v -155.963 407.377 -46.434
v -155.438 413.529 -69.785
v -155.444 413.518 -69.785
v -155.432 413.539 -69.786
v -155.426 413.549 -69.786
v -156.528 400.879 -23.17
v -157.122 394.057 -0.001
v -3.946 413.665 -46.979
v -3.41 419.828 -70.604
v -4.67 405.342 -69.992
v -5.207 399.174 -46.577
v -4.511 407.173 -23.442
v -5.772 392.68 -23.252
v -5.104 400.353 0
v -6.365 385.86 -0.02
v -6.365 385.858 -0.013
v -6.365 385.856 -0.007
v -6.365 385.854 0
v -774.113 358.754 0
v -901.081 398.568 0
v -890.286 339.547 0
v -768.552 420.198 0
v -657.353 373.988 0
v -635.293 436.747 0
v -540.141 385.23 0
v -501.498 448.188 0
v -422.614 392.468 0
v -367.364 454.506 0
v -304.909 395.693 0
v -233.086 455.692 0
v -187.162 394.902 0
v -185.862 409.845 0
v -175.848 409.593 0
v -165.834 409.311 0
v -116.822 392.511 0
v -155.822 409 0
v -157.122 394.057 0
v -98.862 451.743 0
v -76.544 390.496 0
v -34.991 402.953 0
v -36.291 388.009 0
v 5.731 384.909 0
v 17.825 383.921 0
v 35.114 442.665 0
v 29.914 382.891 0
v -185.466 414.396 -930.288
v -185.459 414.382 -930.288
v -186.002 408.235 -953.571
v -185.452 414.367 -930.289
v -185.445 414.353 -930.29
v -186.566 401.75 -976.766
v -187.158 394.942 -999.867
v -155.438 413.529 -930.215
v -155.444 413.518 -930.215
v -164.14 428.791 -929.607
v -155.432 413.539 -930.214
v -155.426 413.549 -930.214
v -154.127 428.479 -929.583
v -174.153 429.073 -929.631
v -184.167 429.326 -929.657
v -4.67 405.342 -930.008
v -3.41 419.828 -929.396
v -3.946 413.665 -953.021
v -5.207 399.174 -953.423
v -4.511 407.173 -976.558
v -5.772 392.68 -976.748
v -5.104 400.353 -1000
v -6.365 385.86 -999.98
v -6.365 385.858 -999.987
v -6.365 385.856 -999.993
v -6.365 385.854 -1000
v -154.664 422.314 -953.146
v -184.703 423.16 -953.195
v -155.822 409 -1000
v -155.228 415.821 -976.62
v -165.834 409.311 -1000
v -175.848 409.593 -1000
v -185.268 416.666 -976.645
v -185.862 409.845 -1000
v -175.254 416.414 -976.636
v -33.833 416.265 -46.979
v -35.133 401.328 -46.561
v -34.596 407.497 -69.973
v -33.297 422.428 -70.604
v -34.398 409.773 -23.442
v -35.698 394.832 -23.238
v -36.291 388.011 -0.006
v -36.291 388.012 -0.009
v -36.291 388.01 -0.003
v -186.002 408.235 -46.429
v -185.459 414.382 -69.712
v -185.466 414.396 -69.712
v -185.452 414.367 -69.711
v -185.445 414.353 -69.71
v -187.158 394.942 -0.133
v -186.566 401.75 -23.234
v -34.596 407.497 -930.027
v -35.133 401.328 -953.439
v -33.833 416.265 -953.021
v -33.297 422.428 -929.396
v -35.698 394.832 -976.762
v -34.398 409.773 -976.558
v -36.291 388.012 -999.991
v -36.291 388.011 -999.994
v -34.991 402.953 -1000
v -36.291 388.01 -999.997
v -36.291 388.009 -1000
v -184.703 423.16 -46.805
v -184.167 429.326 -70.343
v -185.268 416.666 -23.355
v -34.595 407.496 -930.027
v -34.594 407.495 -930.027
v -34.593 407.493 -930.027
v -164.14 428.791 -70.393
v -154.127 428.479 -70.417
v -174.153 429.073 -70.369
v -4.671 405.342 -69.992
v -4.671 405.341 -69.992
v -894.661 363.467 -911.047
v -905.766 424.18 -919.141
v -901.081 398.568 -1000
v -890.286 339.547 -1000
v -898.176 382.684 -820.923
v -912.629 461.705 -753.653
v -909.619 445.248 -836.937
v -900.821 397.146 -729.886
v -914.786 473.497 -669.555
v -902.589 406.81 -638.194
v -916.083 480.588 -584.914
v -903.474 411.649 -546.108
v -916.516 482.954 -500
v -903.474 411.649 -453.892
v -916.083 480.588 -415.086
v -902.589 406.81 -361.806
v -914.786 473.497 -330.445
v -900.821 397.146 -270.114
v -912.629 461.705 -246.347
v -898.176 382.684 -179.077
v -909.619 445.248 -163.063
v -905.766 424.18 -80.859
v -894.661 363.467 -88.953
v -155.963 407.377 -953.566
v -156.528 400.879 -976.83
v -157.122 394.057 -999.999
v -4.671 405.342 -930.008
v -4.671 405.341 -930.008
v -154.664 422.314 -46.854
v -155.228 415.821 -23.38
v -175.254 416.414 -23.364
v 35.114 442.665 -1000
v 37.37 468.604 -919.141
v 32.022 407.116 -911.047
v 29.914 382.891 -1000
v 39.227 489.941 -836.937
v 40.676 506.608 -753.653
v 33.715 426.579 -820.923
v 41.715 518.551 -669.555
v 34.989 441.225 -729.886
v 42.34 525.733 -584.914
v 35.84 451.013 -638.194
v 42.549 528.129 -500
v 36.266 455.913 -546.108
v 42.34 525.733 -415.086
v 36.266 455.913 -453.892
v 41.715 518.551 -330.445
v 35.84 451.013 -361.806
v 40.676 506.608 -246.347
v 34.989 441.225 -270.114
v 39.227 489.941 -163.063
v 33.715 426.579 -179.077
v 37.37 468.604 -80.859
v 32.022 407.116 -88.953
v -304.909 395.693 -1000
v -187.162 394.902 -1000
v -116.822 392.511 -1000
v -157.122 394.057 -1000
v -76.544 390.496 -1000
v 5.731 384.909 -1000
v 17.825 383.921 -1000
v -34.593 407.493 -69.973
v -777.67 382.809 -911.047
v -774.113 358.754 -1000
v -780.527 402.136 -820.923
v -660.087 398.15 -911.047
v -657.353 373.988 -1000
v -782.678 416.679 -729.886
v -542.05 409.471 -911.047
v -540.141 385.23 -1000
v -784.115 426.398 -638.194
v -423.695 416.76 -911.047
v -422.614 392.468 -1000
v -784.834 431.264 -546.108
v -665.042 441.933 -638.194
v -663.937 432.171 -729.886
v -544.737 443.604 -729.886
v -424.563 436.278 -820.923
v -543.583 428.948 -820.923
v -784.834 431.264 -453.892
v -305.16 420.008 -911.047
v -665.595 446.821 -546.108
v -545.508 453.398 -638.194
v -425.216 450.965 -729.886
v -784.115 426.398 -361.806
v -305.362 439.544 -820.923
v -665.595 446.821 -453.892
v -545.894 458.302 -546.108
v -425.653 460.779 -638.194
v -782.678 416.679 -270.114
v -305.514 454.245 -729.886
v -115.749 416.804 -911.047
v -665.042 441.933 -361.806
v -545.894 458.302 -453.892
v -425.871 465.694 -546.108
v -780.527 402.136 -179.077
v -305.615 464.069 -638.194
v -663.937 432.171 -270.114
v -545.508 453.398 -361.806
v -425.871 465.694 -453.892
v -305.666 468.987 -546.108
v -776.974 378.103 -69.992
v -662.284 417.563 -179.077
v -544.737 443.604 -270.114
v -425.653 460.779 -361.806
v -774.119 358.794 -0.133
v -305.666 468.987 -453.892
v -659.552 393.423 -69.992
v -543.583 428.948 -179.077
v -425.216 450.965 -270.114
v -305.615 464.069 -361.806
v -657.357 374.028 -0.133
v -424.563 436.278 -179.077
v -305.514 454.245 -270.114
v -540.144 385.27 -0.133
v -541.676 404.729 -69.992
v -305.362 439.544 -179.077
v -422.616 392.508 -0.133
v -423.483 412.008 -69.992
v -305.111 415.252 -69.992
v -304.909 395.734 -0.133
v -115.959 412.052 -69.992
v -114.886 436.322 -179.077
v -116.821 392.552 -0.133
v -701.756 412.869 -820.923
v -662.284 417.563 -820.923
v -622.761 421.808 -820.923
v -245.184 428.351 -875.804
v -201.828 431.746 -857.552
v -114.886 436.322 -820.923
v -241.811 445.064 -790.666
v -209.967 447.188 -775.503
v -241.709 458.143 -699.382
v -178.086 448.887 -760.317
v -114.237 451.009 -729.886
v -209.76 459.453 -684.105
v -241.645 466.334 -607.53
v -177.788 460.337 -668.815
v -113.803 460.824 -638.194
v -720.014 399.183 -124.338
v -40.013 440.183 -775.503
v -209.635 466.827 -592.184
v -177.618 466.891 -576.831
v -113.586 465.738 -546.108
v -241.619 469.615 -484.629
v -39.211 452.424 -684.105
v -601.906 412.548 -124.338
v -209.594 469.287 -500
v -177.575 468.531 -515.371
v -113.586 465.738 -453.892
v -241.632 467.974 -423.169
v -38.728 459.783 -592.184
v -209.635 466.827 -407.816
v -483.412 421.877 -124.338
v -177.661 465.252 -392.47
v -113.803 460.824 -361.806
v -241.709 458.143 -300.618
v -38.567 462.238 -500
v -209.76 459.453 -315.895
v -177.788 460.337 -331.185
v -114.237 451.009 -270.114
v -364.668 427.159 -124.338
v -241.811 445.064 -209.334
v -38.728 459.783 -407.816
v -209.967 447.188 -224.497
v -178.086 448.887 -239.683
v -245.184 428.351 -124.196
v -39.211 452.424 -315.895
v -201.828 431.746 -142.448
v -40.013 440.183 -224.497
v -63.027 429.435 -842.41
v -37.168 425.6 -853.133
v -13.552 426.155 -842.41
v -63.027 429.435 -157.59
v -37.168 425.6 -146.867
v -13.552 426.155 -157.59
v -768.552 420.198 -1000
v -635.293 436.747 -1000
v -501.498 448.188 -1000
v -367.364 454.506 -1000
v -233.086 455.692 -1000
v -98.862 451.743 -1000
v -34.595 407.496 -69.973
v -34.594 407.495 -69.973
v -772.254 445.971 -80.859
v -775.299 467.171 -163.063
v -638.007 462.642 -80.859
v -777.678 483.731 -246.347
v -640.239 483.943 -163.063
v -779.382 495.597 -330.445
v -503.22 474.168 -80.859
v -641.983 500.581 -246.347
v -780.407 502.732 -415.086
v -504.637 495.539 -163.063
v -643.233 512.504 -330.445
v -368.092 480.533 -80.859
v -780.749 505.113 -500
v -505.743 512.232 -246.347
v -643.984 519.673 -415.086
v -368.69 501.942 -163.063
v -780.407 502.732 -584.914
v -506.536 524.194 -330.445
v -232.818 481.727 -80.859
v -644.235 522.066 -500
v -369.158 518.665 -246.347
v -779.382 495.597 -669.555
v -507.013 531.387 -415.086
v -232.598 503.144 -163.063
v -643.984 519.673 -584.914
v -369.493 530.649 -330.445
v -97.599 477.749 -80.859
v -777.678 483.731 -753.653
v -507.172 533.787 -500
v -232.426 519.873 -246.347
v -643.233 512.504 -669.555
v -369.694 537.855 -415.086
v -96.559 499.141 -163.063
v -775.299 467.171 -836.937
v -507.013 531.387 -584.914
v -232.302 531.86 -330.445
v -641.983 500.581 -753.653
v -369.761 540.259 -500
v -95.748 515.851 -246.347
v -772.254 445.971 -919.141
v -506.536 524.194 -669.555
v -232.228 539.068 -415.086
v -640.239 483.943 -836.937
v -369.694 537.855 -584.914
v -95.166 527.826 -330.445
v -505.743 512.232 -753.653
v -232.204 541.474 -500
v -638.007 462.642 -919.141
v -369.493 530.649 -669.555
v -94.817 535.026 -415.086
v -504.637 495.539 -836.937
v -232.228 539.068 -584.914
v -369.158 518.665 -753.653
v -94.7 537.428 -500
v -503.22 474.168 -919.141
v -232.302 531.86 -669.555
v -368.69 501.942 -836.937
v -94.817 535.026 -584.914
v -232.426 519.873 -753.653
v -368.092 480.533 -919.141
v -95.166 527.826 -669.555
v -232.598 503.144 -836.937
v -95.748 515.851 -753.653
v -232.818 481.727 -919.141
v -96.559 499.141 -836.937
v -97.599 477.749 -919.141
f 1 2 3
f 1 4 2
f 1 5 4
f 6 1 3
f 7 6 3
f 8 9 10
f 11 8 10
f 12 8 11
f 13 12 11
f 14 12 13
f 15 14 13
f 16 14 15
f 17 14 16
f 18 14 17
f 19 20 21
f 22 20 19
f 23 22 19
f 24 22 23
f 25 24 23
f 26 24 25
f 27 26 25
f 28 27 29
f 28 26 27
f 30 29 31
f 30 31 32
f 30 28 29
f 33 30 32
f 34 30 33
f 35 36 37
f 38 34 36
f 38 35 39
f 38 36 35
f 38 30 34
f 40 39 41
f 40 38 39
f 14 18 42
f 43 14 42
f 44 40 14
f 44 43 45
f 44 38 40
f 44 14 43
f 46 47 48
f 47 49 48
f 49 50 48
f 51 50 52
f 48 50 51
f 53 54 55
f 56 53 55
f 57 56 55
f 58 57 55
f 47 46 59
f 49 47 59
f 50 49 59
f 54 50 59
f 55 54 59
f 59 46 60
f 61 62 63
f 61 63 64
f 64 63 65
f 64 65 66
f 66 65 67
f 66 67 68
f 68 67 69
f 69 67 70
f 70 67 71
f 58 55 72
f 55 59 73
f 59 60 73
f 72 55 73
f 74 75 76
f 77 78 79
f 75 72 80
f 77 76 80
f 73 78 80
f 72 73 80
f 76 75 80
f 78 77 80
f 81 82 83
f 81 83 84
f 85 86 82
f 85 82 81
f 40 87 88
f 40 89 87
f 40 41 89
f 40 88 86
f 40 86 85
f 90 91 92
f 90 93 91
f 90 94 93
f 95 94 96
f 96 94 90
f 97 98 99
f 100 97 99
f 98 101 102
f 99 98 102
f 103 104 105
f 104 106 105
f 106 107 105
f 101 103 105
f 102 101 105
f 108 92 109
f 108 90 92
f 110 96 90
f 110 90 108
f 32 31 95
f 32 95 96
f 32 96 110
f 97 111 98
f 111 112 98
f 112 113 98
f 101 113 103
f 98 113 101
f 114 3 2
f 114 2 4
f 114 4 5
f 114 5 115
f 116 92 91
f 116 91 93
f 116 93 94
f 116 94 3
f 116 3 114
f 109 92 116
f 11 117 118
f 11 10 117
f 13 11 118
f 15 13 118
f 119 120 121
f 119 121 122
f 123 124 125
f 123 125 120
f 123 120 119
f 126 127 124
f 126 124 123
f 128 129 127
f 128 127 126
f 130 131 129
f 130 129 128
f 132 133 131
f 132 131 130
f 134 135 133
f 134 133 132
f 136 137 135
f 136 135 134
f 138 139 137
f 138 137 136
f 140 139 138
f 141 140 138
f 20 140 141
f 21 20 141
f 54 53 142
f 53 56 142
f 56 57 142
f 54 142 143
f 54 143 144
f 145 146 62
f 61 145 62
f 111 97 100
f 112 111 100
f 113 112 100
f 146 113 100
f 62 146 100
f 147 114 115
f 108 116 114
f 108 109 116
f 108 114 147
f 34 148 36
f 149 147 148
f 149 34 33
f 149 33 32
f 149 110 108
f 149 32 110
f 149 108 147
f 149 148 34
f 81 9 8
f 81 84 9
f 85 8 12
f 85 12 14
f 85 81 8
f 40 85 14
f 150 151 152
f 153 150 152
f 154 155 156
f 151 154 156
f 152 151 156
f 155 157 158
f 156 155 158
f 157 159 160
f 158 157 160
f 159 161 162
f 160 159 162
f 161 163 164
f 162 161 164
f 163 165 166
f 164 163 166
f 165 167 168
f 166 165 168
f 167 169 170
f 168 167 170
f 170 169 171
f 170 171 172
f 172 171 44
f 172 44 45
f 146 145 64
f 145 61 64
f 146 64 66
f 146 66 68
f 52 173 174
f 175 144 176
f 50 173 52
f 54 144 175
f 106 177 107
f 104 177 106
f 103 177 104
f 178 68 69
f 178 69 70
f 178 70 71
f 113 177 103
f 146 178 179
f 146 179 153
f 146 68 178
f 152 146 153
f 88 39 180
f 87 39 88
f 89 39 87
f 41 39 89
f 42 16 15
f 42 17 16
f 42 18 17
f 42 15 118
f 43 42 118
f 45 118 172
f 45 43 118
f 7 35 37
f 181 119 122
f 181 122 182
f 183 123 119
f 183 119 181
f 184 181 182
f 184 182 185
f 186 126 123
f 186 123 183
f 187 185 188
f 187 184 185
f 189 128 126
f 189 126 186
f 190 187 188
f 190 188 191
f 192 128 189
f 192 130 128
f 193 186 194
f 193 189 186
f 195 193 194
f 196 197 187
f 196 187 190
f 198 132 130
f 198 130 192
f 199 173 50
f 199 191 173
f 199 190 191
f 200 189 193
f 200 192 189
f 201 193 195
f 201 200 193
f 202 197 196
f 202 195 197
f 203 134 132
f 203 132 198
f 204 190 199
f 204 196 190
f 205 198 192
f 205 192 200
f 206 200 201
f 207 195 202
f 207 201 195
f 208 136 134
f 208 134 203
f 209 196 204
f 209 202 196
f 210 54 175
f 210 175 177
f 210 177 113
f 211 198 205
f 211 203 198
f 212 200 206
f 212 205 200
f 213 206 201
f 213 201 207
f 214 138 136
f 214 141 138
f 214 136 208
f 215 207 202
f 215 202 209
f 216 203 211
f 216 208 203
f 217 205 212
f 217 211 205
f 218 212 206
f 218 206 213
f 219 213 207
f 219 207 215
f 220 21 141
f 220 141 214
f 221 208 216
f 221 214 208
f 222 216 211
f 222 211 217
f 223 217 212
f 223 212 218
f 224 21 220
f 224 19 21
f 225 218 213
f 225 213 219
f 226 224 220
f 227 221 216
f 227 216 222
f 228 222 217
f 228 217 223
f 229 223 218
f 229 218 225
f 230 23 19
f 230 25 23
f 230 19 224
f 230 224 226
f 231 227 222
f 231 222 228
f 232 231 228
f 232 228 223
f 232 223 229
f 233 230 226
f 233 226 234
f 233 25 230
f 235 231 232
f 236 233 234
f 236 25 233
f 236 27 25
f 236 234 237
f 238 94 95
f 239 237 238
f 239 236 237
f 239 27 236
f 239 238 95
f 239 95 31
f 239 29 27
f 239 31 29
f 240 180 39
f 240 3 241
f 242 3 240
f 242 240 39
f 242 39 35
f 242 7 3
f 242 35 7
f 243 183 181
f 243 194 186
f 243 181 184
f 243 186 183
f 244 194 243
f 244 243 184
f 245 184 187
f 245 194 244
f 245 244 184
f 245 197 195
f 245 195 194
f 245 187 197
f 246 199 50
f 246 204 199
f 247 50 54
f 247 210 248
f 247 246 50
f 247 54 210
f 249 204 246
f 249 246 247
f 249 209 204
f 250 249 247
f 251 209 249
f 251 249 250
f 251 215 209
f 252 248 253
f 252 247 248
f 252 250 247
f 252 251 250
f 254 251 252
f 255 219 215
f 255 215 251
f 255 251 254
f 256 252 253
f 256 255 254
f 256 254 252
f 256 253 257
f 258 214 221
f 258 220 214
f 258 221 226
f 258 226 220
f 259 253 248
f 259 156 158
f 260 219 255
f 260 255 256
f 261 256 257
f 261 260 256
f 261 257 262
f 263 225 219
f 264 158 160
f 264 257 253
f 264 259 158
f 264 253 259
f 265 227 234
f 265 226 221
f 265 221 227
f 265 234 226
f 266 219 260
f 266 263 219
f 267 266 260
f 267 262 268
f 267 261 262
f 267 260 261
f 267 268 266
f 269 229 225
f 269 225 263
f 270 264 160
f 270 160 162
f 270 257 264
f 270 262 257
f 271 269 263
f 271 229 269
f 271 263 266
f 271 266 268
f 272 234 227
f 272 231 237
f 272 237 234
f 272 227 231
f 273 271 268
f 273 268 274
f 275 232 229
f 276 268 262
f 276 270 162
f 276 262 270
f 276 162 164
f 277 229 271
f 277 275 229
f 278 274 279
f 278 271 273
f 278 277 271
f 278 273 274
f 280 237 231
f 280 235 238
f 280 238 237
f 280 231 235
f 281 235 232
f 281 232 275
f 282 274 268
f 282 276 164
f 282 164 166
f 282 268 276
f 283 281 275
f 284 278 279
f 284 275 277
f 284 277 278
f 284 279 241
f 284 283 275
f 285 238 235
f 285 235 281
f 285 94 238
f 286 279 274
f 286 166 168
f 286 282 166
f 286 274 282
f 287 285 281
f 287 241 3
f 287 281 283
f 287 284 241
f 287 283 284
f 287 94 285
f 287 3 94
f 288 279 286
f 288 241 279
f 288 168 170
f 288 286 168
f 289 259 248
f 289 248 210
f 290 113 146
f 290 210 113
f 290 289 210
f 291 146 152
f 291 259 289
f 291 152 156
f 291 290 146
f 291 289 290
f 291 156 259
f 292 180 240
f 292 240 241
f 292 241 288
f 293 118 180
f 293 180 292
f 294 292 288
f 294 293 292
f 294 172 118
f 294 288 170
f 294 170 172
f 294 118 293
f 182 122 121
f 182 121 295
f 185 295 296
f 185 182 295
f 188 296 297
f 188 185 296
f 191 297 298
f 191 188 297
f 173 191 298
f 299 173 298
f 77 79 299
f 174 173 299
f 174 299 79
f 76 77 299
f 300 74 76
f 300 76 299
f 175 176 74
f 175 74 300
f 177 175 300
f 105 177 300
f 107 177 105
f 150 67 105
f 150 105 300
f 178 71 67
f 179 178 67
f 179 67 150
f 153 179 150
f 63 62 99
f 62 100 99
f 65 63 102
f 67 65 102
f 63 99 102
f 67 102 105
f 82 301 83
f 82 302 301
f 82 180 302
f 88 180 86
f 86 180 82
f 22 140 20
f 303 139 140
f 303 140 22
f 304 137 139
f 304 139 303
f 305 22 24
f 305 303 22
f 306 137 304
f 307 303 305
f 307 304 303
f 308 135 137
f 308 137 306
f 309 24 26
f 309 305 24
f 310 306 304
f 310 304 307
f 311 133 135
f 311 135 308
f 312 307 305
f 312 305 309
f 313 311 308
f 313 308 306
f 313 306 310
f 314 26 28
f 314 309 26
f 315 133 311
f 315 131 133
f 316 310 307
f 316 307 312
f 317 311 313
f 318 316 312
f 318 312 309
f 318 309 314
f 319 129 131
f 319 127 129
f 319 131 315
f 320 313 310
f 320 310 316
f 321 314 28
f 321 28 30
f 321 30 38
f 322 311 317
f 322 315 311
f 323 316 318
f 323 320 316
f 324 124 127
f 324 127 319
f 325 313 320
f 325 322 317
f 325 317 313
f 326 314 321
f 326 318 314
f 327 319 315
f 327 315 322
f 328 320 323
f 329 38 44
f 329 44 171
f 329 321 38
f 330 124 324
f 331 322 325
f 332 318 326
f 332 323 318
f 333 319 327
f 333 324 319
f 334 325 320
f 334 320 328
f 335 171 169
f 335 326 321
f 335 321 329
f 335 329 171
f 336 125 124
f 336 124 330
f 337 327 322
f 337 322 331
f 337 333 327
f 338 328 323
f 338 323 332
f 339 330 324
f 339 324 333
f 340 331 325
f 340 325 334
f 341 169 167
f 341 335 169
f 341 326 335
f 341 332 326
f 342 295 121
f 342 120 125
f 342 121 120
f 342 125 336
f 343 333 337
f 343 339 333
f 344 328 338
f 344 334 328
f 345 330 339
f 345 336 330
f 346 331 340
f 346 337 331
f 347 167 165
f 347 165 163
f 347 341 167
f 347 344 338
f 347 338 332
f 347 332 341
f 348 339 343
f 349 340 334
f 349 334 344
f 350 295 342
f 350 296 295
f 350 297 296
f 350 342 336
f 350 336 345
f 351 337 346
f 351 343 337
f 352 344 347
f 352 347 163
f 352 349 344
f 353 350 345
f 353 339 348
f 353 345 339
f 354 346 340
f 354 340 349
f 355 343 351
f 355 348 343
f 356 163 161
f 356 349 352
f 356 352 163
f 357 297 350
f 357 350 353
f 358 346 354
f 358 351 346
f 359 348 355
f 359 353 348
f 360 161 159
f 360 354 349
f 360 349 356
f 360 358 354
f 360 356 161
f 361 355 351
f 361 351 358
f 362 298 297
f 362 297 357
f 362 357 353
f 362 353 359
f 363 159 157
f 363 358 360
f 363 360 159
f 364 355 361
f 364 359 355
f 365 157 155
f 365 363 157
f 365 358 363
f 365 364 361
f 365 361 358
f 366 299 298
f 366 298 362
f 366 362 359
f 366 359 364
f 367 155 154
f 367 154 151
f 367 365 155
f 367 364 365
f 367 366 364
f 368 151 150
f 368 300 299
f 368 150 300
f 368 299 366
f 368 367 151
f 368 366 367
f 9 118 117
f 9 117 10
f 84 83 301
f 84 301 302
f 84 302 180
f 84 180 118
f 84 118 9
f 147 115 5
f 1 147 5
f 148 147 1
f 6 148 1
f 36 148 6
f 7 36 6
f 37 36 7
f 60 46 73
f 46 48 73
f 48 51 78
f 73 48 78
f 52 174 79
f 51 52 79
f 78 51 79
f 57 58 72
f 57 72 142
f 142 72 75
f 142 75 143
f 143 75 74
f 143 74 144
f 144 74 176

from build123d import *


with BuildPart() as part:
    # Sweep1: sweep along a path in Sketch1
    with BuildLine(Plane.XY) as sweep1_path:
        ThreePointArc((-890.285718, 339.546922), (-431.638177, 392.054842), (29.914282, 382.890989))
    # Sketch3 → Sweep1 (sweep)
    with BuildSketch(Plane(origin=(-890.285718, 339.546922, 0), x_dir=(0, 0, 1), z_dir=(-0.983681, -0.179923, 0))):
        with BuildLine():
            Line((0, 0), (0, 60))
            ThreePointArc((0, 60), (-500, 145.786438), (-1000, 60))
            Line((-1000, 60), (-1000, 0))
            ThreePointArc((-1000, 0), (-500, 73.913317), (0, 0))
        make_face()
    sweep(path=sweep1_path.line)

    # Cut-Sweep1: sweep along a path in Sketch19
    with BuildLine(Plane(origin=(-205.375388, 17.865632, 0), x_dir=(0, 0, -1), z_dir=(0.996238, -0.086663, 0))) as cut_sweep1_path:
        ThreePointArc((70, 403.60426), (34.897149, 394.191626), (0, 384.042894))
    # Sketch4 → Cut-Sweep1 (sweep, cut)
    with BuildSketch(Plane.XY):
        with BuildLine():
            Line((-185.86158, 409.845466), (-187.161523, 394.901901))
            ThreePointArc((-187.161523, 394.901901), (-172.395032, 385.472889), (-157.121749, 394.056733))
            Line((-157.121749, 394.056733), (-155.821806, 409.000299))
            ThreePointArc((-155.821806, 409.000299), (-170.840774, 409.455574), (-185.86158, 409.845466))
        make_face()
    cut_sweep1 = sweep(path=cut_sweep1_path.line, mode=Mode.SUBTRACT)

    # Cut-Sweep6: sweep along a path in Sketch24
    with BuildLine(Plane(origin=(-54.770437, 4.764487, 0), x_dir=(0, 0, -1), z_dir=(0.996238, -0.086663, 0))) as cut_sweep6_path:
        ThreePointArc((70, 403.60426), (34.897149, 394.191626), (0, 384.042894))
    # Sketch22 → Cut-Sweep6 (sweep, cut)
    with BuildSketch(Plane.XY):
        with BuildLine():
            Line((-6.365403, 385.85431), (-5.10418, 400.352779))
            Line((-5.10418, 400.352779), (-34.991311, 402.952665))
            Line((-34.991311, 402.952665), (-36.291253, 388.009099))
            ThreePointArc((-36.291253, 388.009099), (-21.81537, 380.167646), (-6.365403, 385.85431))
        make_face()
    cut_sweep6 = sweep(path=cut_sweep6_path.line, mode=Mode.SUBTRACT)

    # Mirror1: Cut-Sweep1, Cut-Sweep6 across plane
    add(cut_sweep1.mirror(Plane.XY.offset(-500)), mode=Mode.SUBTRACT)
    add(cut_sweep6.mirror(Plane.XY.offset(-500)), mode=Mode.SUBTRACT)


solid = part.part
